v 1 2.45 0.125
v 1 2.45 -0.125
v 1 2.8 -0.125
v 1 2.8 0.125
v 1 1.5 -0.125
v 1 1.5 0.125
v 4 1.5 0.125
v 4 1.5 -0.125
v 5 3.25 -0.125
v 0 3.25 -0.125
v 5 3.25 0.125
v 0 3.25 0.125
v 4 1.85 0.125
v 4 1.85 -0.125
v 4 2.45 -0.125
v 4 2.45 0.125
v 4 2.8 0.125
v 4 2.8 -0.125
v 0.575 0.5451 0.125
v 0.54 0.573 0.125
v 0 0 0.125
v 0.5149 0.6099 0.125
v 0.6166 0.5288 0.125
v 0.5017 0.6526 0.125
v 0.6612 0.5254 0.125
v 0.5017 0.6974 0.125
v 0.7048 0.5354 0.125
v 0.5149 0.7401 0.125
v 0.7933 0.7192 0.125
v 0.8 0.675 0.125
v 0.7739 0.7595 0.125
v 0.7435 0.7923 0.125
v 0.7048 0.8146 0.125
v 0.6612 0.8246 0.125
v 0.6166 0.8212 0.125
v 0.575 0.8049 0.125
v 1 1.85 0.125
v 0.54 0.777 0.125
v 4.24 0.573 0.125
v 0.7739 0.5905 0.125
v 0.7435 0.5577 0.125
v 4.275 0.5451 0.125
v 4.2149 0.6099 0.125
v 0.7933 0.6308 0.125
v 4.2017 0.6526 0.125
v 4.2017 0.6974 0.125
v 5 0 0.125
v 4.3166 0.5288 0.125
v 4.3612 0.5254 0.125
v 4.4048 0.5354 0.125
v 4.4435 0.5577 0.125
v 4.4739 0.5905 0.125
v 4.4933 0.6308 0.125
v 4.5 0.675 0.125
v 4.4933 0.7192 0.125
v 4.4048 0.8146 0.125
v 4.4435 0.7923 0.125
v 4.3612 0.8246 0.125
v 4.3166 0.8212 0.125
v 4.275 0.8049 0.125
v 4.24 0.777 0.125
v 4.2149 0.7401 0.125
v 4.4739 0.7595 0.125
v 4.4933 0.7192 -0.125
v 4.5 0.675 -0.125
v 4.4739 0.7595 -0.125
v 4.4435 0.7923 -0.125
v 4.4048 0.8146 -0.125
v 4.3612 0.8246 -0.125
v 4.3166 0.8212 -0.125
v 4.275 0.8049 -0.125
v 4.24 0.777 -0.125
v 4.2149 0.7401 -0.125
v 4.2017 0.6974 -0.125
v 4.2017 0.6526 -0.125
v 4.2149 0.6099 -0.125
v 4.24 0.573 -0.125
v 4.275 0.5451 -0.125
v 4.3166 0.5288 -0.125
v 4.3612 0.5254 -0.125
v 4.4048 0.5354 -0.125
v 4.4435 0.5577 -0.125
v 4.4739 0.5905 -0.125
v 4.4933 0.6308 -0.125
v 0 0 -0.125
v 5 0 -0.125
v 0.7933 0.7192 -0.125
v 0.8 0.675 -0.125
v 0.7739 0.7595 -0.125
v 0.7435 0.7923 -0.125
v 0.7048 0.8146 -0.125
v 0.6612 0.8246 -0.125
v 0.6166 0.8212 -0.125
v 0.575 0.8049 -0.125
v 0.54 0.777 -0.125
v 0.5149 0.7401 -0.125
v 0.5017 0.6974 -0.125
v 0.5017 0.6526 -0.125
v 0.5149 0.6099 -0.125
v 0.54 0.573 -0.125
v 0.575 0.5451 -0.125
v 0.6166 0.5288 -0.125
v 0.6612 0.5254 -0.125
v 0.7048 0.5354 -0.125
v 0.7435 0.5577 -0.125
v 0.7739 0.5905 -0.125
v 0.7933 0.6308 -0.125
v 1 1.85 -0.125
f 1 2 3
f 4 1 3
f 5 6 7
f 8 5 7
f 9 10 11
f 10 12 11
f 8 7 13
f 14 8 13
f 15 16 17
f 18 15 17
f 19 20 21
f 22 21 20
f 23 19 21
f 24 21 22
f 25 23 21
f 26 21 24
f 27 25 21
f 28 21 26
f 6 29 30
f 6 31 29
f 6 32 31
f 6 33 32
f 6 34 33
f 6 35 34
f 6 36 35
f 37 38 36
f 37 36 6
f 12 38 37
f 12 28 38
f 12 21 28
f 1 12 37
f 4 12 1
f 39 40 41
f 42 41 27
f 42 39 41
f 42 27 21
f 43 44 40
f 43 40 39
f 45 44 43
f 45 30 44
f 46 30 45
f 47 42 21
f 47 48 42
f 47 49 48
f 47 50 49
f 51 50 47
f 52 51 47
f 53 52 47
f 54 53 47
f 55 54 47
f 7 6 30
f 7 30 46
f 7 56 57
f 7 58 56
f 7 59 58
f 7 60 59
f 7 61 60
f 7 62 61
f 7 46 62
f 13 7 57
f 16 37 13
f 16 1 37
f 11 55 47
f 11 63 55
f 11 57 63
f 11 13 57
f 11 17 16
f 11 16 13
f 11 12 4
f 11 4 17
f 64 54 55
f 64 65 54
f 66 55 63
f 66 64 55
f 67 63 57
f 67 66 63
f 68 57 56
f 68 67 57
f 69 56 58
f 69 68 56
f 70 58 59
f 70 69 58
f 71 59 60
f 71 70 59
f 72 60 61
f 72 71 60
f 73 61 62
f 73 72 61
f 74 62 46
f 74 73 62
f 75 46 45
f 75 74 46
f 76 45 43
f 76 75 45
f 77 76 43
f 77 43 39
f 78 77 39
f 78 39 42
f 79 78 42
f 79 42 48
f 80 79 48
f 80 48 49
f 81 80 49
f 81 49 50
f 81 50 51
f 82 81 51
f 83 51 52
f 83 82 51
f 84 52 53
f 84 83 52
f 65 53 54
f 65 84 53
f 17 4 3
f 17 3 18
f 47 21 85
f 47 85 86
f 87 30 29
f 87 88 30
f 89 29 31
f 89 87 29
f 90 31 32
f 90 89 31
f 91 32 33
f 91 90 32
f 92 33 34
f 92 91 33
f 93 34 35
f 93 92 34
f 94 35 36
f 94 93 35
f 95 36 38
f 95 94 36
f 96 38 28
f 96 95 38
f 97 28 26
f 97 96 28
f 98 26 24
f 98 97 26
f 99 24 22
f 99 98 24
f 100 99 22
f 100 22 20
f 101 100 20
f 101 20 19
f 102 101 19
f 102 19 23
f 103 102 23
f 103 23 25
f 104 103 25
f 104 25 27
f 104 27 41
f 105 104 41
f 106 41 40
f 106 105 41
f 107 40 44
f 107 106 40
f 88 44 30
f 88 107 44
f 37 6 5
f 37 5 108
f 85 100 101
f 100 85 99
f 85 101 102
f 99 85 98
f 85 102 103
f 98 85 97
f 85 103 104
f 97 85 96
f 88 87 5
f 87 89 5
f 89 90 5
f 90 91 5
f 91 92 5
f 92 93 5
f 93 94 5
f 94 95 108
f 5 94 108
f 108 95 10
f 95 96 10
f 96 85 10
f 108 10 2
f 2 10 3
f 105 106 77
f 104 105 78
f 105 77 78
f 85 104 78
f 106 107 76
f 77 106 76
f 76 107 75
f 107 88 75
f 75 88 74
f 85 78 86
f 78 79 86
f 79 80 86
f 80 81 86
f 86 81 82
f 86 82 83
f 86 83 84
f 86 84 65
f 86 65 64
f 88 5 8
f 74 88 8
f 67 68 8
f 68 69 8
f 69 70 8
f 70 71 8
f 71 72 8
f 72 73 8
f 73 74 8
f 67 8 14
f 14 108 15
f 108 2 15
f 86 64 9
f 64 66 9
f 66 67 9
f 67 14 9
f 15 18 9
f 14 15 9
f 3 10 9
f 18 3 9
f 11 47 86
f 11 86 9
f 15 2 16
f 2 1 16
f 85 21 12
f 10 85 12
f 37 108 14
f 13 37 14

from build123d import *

# Parameters (mm, degrees)
FRAME_OUTLINE_W     = 5
FRAME_OUTLINE_H     = 3.25
FRAME_OUTLINE_R     = 0.15
FRAME_OUTLINE_W_2   = 3
FRAME_OUTLINE_H_2   = 0.35
BOSS_EXTRUDE1_DEPTH = 0.125


with BuildPart() as part:
    # frame_outline → Boss-Extrude1 (new, symmetric)
    with BuildSketch(Plane.XY):
        with Locations((2.5, 1.625)):
            Rectangle(FRAME_OUTLINE_W, FRAME_OUTLINE_H)
        with Locations((0.65, 0.675)):
            Circle(FRAME_OUTLINE_R, mode=Mode.SUBTRACT)
        with Locations((4.35, 0.675)):
            Circle(FRAME_OUTLINE_R, mode=Mode.SUBTRACT)
        with Locations((2.5, 1.675)):
            Rectangle(FRAME_OUTLINE_W_2, FRAME_OUTLINE_H_2, mode=Mode.SUBTRACT)
        with Locations((2.5, 2.625)):
            Rectangle(FRAME_OUTLINE_W_2, FRAME_OUTLINE_H_2, mode=Mode.SUBTRACT)
    extrude(amount=BOSS_EXTRUDE1_DEPTH, both=True)


solid = part.part
